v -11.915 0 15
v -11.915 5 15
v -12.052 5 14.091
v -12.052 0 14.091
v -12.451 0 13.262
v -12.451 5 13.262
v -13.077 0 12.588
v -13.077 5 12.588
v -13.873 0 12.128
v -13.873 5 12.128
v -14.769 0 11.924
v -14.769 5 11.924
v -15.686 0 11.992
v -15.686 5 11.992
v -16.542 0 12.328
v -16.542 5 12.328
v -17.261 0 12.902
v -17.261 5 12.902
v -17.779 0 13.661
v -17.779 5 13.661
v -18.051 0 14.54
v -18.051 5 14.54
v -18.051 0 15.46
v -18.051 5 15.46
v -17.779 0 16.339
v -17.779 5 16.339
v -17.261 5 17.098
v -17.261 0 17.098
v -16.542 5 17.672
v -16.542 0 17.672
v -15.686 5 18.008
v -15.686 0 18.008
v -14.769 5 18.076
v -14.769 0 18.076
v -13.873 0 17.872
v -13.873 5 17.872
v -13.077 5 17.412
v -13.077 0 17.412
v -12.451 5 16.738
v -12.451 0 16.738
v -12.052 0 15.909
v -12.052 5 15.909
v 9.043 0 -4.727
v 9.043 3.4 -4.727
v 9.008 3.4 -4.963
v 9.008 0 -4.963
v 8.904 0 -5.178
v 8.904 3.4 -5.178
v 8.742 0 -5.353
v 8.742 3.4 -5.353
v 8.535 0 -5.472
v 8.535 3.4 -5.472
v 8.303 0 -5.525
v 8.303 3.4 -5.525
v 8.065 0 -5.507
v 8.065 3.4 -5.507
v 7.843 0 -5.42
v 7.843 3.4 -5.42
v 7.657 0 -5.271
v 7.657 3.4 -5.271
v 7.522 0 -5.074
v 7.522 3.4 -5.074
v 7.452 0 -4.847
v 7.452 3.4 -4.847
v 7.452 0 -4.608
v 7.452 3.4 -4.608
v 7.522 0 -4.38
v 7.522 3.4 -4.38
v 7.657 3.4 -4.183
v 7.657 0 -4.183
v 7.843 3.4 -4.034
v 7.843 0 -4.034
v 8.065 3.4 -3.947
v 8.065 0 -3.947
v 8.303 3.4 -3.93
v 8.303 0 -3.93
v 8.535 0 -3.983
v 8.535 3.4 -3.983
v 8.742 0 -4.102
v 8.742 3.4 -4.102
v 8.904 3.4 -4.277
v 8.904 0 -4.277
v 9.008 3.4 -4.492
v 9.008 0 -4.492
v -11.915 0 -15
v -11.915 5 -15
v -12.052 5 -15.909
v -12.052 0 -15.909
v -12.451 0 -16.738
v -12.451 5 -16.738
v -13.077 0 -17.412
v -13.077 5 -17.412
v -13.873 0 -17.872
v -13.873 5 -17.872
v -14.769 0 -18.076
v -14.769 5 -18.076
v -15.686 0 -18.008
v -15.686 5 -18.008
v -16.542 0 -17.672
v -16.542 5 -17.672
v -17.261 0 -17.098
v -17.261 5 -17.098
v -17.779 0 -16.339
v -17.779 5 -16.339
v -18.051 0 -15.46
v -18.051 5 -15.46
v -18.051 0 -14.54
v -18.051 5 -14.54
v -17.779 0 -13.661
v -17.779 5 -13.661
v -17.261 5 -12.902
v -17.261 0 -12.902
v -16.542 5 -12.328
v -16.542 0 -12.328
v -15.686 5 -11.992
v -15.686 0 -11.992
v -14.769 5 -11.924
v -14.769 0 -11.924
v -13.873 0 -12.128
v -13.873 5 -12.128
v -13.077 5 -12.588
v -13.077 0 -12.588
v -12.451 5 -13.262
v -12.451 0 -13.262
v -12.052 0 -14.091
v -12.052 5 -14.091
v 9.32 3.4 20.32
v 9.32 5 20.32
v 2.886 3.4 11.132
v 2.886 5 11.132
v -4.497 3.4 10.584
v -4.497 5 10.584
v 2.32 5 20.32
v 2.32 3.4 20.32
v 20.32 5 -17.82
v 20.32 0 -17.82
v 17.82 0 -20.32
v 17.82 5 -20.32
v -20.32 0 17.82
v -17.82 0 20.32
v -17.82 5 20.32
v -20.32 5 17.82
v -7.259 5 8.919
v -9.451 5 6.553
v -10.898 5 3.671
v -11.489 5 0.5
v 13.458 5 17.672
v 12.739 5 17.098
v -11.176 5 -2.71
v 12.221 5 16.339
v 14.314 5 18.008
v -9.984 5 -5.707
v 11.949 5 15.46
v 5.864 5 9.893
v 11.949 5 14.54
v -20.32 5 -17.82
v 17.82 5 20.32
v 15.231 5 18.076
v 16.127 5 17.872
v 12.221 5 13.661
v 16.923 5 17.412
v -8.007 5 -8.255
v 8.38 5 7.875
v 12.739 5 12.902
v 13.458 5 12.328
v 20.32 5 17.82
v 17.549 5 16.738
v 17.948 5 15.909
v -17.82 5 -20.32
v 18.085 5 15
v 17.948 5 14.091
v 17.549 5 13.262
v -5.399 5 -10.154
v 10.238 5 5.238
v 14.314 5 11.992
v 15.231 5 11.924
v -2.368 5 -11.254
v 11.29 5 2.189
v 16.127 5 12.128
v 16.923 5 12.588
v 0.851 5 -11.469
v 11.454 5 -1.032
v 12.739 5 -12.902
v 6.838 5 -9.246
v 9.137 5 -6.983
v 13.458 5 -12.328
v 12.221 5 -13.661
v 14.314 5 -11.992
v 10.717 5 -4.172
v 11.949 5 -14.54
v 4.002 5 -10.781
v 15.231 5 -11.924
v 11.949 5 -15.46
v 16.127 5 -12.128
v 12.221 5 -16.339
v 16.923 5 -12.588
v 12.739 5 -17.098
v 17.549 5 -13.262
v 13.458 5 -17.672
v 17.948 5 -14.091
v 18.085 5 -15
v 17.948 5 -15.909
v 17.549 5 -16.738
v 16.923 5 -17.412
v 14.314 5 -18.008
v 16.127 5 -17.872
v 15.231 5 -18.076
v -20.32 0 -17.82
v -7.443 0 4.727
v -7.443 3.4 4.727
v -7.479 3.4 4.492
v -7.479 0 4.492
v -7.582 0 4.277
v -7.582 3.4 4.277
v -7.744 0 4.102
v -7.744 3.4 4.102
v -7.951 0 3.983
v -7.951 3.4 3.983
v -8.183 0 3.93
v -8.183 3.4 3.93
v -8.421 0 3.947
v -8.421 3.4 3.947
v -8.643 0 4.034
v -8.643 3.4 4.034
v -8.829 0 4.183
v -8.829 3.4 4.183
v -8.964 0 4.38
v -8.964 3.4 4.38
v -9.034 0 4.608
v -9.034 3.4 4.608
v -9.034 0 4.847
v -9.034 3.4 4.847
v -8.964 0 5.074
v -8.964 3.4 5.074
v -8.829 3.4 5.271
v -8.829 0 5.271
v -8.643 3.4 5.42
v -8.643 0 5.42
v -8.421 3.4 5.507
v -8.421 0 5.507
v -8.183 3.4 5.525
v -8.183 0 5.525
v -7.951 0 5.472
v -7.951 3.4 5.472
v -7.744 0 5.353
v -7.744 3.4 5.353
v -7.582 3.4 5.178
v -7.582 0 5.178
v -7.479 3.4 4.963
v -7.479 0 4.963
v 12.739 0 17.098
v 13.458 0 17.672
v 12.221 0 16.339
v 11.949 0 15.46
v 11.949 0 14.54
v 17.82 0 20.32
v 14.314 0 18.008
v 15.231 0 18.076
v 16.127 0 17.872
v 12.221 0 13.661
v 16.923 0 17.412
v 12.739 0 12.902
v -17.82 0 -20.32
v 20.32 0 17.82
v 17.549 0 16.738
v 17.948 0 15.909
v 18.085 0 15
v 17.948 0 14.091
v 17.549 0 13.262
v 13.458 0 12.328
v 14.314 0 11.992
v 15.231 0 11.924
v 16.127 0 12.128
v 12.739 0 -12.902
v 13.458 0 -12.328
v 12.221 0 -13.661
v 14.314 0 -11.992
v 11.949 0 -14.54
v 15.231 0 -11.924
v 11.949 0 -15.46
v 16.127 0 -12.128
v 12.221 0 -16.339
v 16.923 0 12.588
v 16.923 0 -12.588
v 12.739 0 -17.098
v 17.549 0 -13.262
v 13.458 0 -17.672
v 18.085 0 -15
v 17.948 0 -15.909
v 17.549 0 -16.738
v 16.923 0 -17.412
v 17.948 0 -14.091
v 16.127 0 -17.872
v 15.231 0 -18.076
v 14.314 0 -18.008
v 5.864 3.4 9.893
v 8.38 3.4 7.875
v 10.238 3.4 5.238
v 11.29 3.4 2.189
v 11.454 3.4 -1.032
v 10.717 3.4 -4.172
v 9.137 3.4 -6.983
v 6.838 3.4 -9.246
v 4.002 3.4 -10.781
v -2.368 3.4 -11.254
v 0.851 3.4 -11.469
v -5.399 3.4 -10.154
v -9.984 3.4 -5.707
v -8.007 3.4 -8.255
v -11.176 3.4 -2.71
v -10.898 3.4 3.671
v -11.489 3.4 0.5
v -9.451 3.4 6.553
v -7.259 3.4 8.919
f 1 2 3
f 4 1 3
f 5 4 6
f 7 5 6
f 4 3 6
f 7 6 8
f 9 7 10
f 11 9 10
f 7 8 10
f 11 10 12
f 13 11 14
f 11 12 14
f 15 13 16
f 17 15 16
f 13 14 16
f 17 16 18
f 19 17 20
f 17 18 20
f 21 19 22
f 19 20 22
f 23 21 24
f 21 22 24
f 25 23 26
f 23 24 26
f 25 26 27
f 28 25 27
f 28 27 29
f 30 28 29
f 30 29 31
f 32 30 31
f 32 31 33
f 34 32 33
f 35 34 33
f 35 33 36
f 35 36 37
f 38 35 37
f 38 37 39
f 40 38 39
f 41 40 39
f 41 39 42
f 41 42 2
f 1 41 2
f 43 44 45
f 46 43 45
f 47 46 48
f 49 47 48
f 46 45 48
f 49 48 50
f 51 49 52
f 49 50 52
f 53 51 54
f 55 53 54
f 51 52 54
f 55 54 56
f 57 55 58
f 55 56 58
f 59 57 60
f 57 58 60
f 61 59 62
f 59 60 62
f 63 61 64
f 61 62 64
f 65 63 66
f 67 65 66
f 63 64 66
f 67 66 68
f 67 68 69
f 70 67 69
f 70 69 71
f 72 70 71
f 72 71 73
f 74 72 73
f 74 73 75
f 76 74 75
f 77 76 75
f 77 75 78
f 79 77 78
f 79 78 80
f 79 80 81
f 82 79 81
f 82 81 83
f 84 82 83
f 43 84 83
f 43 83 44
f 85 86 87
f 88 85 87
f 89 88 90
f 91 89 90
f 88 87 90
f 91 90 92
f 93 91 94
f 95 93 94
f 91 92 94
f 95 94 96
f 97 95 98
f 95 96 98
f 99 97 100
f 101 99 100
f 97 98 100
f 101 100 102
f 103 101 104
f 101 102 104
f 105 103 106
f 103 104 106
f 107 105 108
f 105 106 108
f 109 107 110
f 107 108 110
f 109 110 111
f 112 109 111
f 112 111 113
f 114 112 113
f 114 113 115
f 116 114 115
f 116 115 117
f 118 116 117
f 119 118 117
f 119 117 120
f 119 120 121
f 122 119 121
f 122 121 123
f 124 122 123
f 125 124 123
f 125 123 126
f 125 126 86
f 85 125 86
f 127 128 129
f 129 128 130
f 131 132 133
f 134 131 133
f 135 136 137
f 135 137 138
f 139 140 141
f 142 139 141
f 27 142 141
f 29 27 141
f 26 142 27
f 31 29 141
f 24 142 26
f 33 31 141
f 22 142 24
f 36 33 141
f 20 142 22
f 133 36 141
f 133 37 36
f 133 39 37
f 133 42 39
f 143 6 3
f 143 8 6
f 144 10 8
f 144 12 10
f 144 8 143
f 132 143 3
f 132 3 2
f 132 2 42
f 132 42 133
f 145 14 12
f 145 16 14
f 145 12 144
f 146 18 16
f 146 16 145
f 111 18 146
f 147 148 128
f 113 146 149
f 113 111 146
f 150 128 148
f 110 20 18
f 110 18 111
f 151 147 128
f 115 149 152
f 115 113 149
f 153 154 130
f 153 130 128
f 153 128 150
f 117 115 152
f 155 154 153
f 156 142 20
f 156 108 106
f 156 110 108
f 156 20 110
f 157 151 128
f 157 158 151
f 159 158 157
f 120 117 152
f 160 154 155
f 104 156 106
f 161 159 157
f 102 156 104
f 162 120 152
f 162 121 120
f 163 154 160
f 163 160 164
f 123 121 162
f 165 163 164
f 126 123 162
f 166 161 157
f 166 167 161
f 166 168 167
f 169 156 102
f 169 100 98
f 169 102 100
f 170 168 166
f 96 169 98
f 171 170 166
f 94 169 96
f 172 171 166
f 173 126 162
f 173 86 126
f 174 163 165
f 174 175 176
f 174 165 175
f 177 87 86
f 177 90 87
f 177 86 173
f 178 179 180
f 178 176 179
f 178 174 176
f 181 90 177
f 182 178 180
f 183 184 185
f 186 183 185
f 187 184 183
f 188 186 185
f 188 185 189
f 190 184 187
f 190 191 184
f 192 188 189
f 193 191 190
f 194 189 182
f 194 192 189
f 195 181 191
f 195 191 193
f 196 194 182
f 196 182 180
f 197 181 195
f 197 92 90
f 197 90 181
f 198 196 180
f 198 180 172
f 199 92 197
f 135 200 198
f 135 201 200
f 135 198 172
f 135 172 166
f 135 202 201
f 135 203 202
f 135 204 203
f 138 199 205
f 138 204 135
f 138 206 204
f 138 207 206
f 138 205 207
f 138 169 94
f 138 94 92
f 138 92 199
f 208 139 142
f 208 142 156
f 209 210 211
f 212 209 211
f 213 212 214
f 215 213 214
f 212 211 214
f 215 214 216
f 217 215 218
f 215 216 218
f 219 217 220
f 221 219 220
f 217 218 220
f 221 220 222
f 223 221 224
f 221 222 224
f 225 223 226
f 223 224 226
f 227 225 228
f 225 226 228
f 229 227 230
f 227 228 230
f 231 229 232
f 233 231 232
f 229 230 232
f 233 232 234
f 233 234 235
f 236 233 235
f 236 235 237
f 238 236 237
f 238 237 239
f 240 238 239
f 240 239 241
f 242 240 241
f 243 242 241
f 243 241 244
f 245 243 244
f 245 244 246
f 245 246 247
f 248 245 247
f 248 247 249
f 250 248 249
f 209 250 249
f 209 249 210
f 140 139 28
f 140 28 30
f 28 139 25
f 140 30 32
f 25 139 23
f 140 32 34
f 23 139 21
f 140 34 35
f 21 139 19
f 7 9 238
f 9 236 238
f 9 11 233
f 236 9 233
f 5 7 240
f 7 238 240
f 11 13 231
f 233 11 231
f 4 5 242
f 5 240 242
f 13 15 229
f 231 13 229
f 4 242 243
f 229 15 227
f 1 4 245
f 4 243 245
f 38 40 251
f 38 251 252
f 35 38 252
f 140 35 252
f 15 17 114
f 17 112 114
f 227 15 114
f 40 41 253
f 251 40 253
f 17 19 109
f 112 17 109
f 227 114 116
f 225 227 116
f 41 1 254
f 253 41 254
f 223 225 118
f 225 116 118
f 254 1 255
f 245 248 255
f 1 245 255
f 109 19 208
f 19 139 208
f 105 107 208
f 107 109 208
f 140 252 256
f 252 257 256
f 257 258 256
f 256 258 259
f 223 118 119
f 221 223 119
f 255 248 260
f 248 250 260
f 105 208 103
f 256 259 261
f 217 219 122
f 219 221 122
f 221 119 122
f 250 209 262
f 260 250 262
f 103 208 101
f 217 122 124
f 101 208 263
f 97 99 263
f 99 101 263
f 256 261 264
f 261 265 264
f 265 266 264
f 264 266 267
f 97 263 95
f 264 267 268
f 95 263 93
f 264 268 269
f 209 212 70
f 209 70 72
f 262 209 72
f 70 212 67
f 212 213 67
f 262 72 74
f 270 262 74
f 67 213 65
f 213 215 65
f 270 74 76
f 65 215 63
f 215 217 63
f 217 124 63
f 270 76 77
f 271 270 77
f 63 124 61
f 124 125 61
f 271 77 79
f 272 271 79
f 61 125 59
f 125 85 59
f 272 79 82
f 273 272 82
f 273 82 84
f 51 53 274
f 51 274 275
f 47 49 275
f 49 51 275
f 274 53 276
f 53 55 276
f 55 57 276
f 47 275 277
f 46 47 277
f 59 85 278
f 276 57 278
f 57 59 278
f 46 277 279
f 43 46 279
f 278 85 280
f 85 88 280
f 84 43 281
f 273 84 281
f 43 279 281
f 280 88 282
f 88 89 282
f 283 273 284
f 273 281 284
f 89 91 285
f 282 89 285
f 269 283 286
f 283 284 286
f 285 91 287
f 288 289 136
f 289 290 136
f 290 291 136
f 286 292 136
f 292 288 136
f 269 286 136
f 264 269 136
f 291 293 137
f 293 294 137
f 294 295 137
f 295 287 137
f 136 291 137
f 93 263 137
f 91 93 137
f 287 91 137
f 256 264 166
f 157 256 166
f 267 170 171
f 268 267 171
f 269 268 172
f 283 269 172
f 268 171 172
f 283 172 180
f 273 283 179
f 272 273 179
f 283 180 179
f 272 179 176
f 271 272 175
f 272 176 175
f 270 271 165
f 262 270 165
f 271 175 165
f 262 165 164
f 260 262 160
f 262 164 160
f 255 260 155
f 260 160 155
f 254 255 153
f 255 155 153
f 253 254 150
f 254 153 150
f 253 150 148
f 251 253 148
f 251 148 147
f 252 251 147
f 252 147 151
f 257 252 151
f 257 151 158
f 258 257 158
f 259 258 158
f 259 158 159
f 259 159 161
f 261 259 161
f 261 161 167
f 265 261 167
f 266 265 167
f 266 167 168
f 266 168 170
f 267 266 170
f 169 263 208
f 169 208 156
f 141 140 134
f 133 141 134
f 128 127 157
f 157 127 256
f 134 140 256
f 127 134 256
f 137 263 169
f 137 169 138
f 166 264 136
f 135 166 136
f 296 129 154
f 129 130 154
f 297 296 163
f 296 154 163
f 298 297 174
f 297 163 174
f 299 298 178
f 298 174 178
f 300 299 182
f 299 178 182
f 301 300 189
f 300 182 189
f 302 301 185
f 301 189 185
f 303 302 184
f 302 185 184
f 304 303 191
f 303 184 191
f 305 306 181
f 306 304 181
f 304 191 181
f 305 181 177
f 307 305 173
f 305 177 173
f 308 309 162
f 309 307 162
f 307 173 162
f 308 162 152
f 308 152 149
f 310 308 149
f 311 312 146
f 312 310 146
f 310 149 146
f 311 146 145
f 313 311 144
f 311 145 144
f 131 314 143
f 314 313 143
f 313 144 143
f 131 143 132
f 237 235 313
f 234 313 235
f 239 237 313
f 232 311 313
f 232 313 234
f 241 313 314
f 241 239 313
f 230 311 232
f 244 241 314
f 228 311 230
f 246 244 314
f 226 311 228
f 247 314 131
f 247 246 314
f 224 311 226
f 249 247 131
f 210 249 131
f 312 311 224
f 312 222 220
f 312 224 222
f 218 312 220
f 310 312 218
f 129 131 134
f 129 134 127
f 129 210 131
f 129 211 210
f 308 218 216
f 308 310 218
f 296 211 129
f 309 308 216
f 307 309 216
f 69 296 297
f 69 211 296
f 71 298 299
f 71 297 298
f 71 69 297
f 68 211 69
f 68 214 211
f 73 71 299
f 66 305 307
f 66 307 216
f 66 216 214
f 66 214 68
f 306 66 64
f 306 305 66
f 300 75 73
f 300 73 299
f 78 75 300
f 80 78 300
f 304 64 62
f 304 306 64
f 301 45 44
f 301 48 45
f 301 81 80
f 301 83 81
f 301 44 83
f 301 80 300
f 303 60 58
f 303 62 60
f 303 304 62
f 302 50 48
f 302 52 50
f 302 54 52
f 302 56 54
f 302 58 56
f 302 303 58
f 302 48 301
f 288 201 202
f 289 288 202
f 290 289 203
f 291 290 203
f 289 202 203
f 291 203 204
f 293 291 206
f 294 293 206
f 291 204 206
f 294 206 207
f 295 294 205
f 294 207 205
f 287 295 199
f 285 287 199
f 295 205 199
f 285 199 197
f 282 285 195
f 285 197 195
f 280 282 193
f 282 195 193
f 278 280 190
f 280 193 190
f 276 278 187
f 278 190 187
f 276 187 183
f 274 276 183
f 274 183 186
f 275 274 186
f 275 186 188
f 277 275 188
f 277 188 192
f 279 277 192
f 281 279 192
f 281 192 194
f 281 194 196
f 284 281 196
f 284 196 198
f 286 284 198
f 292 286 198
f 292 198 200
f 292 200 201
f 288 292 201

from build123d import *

# Parameters (mm, degrees)
SKETCH1_W           = 40.64
SKETCH1_H           = 40.64
BOSS_EXTRUDE1_DEPTH = 5
CUT_EXTRUDE1_REACH  = 7
SKETCH2_R           = 3.085
CHAMFER1_SIZE       = 2.5
SKETCH3_R           = 11.5
CUT_EXTRUDE2_DEPTH  = 1.6
SKETCH7_R           = 0.8
CUT_EXTRUDE6_DEPTH  = 4.4
CUT_EXTRUDE7_DEPTH  = 1.6


with BuildPart() as part:
    # Sketch1 → Boss-Extrude1 (new body)
    with BuildSketch(Plane(origin=(0, 0, 0), x_dir=(1, 0, 0), z_dir=(0, 1, 0))):
        Rectangle(SKETCH1_W, SKETCH1_H)
    extrude(amount=BOSS_EXTRUDE1_DEPTH)

    # Sketch2 → Cut-Extrude1 (cut, up to next)
    with BuildSketch(Plane(origin=(0, 5, 0), x_dir=(1, 0, 0), z_dir=(0, 1, 0)), mode=Mode.PRIVATE) as cut_extrude1_sk1:
        with Locations((-15, 15)):
            Circle(SKETCH2_R)
    cut_extrude1_tool1 = extrude(cut_extrude1_sk1.sketch, amount=-CUT_EXTRUDE1_REACH, mode=Mode.PRIVATE) & part.part
    add(cut_extrude1_tool1.solids().sort_by_distance((-15, 5, -15))[0], mode=Mode.SUBTRACT)
    # Sketch2 → Cut-Extrude1 (cut, up to next)
    with BuildSketch(Plane(origin=(0, 5, 0), x_dir=(1, 0, 0), z_dir=(0, 1, 0)), mode=Mode.PRIVATE) as cut_extrude1_sk2:
        with Locations((15, 15)):
            Circle(SKETCH2_R)
    cut_extrude1_tool2 = extrude(cut_extrude1_sk2.sketch, amount=-CUT_EXTRUDE1_REACH, mode=Mode.PRIVATE) & part.part
    add(cut_extrude1_tool2.solids().sort_by_distance((15, 5, -15))[0], mode=Mode.SUBTRACT)
    # Sketch2 → Cut-Extrude1 (cut, up to next)
    with BuildSketch(Plane(origin=(0, 5, 0), x_dir=(1, 0, 0), z_dir=(0, 1, 0)), mode=Mode.PRIVATE) as cut_extrude1_sk3:
        with Locations((15, -15)):
            Circle(SKETCH2_R)
    cut_extrude1_tool3 = extrude(cut_extrude1_sk3.sketch, amount=-CUT_EXTRUDE1_REACH, mode=Mode.PRIVATE) & part.part
    add(cut_extrude1_tool3.solids().sort_by_distance((15, 5, 15))[0], mode=Mode.SUBTRACT)
    # Sketch2 → Cut-Extrude1 (cut, up to next)
    with BuildSketch(Plane(origin=(0, 5, 0), x_dir=(1, 0, 0), z_dir=(0, 1, 0)), mode=Mode.PRIVATE) as cut_extrude1_sk4:
        with Locations((-15, -15)):
            Circle(SKETCH2_R)
    cut_extrude1_tool4 = extrude(cut_extrude1_sk4.sketch, amount=-CUT_EXTRUDE1_REACH, mode=Mode.PRIVATE) & part.part
    add(cut_extrude1_tool4.solids().sort_by_distance((-15, 5, 15))[0], mode=Mode.SUBTRACT)

    # Chamfer1
    chamfer1_edges = [part.edges().sort_by_distance(p)[0] for p in [
        (20.32, 2.5, 20.32),
        (-20.32, 2.5, 20.32),
        (-20.32, 2.5, -20.32),
        (20.32, 2.5, -20.32),
    ]]
    chamfer(chamfer1_edges, length=CHAMFER1_SIZE)

    # Sketch3 → Cut-Extrude2 (cut)
    with BuildSketch(Plane(origin=(0, 5, 0), x_dir=(1, 0, 0), z_dir=(0, 1, 0))):
        Circle(SKETCH3_R)
    extrude(amount=-CUT_EXTRUDE2_DEPTH, mode=Mode.SUBTRACT)

    # Sketch7 → Cut-Extrude6 (cut, through all)
    with BuildSketch(Plane(origin=(0, 3.4, 0), x_dir=(1, 0, 0), z_dir=(0, 1, 0))):
        with Locations((-8.243053696, -4.727309167)):
            Circle(SKETCH7_R)
        with Locations((8.243053696, 4.727309167)):
            Circle(SKETCH7_R)
    extrude(amount=-CUT_EXTRUDE6_DEPTH, mode=Mode.SUBTRACT)

    # Sketch8 → Cut-Extrude7 (cut)
    with BuildSketch(Plane(origin=(0, 5, 0), x_dir=(1, 0, 0), z_dir=(0, 1, 0))):
        with BuildLine():
            ThreePointArc((2.886406189, -11.131875822), (-0.850588117, -11.468500332), (-4.497034553, -10.584265692))
            Line((-4.497034553, -10.584265692), (2.32, -20.32))
            Line((2.32, -20.32), (9.32, -20.32))
            Line((9.32, -20.32), (2.886406189, -11.131875822))
        make_face()
    extrude(amount=-CUT_EXTRUDE7_DEPTH, mode=Mode.SUBTRACT)


solid = part.part
